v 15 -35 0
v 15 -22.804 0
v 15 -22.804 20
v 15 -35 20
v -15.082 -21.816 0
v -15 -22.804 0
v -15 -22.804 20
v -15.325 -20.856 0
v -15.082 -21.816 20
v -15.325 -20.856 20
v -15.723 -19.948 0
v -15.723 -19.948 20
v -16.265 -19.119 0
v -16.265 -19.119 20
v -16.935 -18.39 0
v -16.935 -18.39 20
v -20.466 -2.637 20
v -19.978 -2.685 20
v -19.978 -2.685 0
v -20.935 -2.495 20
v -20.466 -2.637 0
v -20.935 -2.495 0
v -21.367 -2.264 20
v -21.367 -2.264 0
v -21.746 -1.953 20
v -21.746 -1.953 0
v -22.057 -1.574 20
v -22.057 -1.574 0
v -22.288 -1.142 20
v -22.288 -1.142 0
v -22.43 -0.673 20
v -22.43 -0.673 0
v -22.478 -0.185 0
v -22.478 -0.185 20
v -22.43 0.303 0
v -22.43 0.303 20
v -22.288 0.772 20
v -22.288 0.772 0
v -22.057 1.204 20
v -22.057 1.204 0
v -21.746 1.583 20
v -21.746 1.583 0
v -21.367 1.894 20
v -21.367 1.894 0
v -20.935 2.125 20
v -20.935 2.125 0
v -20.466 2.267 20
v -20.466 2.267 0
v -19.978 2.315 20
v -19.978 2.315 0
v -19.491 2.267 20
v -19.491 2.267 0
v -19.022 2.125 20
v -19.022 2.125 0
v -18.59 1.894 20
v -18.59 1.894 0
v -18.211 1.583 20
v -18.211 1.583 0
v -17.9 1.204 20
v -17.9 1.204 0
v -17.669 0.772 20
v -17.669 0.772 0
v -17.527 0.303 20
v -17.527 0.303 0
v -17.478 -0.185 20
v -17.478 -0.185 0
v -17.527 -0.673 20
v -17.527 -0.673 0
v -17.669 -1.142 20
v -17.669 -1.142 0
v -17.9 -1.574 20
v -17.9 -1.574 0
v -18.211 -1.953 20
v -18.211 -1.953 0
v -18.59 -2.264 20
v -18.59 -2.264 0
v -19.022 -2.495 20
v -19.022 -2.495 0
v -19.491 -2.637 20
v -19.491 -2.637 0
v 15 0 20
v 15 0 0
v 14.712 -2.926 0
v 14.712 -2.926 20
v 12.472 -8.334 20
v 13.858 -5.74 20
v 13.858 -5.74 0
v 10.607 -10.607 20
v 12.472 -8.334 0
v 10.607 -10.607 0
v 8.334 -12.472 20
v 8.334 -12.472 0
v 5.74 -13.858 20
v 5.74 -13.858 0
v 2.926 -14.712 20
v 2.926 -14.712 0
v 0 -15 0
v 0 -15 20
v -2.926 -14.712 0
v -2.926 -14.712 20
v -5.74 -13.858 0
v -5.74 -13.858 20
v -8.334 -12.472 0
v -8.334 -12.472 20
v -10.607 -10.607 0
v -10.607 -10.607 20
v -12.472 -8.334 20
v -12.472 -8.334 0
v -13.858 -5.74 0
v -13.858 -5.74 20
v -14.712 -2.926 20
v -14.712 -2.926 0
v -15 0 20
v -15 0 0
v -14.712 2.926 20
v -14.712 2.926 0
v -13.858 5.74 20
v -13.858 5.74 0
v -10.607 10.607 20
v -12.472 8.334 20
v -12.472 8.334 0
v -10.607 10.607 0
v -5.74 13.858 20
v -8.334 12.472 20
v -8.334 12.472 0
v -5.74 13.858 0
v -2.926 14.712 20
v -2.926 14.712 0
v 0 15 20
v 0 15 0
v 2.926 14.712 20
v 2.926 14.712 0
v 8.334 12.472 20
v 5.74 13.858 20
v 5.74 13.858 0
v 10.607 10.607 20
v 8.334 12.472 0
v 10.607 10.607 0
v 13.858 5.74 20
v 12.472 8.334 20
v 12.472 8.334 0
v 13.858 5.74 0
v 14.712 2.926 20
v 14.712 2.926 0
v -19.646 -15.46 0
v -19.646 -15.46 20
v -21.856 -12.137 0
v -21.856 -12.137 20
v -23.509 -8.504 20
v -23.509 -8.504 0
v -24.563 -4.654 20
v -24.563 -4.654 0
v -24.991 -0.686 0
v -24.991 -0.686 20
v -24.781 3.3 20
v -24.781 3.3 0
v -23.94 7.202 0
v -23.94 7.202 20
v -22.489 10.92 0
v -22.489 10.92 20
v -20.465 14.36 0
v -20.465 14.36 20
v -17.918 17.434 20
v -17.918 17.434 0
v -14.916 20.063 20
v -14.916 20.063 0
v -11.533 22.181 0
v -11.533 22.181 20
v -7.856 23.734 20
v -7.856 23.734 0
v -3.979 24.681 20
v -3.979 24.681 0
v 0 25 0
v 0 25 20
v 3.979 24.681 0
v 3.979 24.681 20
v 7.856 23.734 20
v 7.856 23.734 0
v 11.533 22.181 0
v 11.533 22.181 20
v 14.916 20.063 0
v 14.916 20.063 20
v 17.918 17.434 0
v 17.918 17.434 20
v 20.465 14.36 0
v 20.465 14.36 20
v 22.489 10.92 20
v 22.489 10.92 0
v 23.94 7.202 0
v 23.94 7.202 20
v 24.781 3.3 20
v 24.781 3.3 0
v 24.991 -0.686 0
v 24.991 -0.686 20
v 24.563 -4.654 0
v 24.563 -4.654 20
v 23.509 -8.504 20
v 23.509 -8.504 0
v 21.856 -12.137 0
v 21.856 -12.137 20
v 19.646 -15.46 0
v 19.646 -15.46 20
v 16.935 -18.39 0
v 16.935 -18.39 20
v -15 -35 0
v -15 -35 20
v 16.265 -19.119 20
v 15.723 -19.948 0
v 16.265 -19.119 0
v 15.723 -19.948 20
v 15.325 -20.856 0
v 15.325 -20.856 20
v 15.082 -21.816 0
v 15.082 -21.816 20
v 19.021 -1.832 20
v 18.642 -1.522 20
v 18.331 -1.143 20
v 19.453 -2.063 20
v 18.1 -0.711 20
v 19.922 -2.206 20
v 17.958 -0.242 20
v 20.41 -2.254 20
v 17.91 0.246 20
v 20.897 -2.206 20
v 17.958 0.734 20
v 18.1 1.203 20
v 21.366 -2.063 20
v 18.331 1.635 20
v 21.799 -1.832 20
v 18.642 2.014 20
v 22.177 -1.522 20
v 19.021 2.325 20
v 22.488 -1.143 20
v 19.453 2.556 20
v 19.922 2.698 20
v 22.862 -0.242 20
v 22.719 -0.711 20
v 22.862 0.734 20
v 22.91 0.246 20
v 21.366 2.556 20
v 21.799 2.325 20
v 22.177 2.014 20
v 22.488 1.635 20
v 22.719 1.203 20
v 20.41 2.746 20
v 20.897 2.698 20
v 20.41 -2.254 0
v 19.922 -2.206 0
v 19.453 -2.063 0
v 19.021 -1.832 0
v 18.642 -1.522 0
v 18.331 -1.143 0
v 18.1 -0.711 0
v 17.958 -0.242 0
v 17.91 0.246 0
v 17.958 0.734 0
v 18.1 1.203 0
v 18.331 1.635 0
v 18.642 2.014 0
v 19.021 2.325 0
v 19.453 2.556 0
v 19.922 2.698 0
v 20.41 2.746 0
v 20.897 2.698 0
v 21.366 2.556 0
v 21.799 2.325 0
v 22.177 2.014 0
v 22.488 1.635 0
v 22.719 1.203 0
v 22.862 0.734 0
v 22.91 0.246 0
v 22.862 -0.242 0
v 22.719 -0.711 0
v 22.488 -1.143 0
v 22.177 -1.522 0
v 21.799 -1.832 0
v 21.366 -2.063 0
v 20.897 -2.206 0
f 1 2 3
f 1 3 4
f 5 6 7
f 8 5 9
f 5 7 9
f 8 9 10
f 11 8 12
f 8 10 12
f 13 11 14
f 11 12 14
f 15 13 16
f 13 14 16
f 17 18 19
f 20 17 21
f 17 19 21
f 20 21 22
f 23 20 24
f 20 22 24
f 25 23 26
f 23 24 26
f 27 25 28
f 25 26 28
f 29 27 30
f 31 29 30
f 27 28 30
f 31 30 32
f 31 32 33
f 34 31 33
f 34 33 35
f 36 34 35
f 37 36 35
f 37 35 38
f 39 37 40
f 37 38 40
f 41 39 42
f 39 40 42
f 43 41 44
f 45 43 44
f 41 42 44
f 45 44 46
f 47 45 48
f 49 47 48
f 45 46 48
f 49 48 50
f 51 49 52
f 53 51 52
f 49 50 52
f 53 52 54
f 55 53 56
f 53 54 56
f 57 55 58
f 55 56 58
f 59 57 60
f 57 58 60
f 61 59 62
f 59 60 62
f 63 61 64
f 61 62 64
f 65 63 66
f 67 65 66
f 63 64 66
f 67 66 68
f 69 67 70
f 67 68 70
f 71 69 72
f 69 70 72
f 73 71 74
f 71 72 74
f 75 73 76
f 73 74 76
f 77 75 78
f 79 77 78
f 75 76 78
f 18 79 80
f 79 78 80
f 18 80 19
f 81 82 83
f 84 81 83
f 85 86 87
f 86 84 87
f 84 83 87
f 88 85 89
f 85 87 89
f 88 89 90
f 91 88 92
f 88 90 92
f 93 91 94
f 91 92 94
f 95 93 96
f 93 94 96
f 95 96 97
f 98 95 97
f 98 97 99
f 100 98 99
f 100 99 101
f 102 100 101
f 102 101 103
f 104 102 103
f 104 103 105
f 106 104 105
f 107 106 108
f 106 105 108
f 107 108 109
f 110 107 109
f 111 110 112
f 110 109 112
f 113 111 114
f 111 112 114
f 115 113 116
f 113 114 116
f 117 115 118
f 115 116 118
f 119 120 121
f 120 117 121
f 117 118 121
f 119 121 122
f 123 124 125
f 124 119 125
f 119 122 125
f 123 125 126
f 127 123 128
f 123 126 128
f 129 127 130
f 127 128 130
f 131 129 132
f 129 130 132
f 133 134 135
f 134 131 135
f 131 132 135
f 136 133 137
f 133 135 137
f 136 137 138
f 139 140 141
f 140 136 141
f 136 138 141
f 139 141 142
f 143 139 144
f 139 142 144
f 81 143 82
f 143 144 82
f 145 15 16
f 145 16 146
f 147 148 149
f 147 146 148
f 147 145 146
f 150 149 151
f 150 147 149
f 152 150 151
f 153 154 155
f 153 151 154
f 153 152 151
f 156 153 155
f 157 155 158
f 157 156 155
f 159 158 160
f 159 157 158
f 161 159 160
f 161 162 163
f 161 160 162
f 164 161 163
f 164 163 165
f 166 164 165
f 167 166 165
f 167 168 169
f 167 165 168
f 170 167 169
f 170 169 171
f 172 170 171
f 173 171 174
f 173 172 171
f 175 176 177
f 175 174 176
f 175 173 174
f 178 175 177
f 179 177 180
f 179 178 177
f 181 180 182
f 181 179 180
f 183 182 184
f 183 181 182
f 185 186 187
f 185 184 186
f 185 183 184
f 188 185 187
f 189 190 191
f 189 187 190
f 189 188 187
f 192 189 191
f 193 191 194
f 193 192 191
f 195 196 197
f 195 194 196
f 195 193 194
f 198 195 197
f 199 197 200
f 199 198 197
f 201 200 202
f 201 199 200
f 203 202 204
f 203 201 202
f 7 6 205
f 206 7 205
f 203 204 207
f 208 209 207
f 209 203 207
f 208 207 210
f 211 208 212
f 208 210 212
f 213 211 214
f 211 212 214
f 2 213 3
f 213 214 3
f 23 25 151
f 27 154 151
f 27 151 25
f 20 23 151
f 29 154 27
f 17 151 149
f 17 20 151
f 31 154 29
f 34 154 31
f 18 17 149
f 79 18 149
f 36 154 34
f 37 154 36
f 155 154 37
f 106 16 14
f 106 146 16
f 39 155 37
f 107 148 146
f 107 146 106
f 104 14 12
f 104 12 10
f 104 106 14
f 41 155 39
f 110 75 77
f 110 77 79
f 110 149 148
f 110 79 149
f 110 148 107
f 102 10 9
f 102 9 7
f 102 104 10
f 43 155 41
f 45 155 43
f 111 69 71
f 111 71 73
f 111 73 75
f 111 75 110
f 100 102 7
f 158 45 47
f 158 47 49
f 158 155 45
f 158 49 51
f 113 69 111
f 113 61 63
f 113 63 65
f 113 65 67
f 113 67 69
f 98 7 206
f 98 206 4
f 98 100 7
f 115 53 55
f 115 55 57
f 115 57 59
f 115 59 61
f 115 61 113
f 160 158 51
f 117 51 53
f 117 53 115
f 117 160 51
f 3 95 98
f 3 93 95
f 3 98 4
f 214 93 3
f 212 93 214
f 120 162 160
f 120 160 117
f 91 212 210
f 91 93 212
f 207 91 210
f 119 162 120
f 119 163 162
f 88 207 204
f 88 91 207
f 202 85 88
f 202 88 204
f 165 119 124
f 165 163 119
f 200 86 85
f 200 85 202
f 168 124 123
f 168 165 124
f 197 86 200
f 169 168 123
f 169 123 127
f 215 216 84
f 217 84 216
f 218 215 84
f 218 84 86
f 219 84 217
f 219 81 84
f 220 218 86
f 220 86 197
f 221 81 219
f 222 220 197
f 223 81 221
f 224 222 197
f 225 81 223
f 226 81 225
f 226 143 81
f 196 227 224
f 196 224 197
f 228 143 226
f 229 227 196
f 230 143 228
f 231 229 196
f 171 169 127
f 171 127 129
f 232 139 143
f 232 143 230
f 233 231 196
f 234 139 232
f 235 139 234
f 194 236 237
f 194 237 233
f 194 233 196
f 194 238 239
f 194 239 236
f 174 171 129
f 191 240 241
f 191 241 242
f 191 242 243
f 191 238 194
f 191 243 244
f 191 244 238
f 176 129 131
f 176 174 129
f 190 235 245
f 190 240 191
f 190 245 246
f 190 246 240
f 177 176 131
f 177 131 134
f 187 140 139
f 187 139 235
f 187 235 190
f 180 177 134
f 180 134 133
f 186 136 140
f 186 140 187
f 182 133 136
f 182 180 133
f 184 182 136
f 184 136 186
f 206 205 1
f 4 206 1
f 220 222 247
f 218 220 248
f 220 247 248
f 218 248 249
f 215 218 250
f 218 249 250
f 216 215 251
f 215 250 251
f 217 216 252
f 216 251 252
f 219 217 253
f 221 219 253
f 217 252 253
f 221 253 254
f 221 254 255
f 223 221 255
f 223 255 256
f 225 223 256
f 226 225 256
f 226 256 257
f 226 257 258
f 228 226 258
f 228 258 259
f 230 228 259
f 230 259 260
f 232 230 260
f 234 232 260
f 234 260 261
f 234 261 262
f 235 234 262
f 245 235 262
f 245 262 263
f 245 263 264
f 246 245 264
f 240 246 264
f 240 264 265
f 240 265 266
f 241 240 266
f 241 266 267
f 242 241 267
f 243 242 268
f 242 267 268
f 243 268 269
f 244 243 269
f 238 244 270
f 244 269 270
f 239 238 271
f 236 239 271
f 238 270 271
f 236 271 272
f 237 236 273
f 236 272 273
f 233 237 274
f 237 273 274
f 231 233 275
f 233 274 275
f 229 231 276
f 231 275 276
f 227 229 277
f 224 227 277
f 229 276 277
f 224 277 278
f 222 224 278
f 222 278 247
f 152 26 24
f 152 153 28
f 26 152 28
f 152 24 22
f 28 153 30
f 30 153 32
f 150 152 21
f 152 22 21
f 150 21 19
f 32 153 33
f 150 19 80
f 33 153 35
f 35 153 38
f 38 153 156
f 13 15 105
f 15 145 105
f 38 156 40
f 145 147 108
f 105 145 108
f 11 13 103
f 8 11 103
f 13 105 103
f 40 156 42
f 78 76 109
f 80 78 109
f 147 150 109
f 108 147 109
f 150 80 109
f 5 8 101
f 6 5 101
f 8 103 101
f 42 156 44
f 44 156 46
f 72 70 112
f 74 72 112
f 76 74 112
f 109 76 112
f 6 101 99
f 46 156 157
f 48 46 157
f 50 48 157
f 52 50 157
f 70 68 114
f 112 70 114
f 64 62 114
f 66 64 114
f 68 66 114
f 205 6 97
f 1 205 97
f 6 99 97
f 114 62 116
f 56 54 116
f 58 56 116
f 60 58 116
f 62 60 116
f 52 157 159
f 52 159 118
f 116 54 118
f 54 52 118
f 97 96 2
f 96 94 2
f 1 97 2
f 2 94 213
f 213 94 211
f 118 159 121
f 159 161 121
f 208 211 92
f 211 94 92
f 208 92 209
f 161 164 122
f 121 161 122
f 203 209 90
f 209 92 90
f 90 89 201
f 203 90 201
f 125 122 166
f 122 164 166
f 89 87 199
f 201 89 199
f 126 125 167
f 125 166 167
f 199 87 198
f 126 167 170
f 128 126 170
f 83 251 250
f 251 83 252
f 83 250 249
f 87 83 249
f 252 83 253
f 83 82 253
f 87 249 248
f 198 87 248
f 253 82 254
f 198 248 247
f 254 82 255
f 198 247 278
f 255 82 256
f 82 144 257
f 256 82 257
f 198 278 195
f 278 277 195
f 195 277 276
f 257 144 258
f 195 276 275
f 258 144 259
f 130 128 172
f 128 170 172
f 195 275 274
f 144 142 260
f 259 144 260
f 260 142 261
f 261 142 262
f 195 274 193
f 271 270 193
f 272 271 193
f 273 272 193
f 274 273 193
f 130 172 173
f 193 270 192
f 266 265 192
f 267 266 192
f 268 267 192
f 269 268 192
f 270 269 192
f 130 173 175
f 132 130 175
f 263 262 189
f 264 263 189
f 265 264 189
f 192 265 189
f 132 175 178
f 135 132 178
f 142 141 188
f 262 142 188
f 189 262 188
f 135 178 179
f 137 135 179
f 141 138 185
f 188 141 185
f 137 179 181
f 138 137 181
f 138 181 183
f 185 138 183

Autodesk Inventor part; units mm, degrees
ref_plane "YZ Plane" through (0, 0, 0) normal (1, 0, 0) x (0, 1, 0)
ref_plane "XZ Plane" through (0, 0, 0) normal (0, 1, 0) x (-1, 0, 0)
ref_plane "XY Plane" through (0, 0, 0) normal (0, 0, 1) x (1, 0, 0)
sketch "Sketch1" plane through (0, 0, 0) normal (0, 0, 1) x (1, 0, 0)
  circle A0 centre (0, 0) radius 15
  arc A1 (15, -20) -> (-15, -20) centre (0, 0) ccw
  line L0 (-15, -20) -> (-15, -35)
  line L1 (-15, -35) -> (15, -35)
  line L2 (15, -20) -> (15, -35)
  dimension "d0" = 30
  dimension "d1" = 50
  dimension "d2" = 15
extrude "Extrusion1" add sketch "Sketch1" along normal blind 20
sketch "Sketch2" plane through (0, 0, 20) normal (0, 0, 1) x (1, 0, 0)
  point P0 (0, 0)
  point P1 (-19.9785, -0.185)
  point P2 (20.4097, 0.2462)
hole "Hole1" at (0, 0, 20) at (-19.9785, -0.185, 20) at (20.4097, 0.2462, 20) direction (0, 0, -1) diameter 5 end through all
fillet "Fillet1" radius 6 2 edges at (15, -20, 10) (-15, -20, 10)
properties part number "TPS base"
